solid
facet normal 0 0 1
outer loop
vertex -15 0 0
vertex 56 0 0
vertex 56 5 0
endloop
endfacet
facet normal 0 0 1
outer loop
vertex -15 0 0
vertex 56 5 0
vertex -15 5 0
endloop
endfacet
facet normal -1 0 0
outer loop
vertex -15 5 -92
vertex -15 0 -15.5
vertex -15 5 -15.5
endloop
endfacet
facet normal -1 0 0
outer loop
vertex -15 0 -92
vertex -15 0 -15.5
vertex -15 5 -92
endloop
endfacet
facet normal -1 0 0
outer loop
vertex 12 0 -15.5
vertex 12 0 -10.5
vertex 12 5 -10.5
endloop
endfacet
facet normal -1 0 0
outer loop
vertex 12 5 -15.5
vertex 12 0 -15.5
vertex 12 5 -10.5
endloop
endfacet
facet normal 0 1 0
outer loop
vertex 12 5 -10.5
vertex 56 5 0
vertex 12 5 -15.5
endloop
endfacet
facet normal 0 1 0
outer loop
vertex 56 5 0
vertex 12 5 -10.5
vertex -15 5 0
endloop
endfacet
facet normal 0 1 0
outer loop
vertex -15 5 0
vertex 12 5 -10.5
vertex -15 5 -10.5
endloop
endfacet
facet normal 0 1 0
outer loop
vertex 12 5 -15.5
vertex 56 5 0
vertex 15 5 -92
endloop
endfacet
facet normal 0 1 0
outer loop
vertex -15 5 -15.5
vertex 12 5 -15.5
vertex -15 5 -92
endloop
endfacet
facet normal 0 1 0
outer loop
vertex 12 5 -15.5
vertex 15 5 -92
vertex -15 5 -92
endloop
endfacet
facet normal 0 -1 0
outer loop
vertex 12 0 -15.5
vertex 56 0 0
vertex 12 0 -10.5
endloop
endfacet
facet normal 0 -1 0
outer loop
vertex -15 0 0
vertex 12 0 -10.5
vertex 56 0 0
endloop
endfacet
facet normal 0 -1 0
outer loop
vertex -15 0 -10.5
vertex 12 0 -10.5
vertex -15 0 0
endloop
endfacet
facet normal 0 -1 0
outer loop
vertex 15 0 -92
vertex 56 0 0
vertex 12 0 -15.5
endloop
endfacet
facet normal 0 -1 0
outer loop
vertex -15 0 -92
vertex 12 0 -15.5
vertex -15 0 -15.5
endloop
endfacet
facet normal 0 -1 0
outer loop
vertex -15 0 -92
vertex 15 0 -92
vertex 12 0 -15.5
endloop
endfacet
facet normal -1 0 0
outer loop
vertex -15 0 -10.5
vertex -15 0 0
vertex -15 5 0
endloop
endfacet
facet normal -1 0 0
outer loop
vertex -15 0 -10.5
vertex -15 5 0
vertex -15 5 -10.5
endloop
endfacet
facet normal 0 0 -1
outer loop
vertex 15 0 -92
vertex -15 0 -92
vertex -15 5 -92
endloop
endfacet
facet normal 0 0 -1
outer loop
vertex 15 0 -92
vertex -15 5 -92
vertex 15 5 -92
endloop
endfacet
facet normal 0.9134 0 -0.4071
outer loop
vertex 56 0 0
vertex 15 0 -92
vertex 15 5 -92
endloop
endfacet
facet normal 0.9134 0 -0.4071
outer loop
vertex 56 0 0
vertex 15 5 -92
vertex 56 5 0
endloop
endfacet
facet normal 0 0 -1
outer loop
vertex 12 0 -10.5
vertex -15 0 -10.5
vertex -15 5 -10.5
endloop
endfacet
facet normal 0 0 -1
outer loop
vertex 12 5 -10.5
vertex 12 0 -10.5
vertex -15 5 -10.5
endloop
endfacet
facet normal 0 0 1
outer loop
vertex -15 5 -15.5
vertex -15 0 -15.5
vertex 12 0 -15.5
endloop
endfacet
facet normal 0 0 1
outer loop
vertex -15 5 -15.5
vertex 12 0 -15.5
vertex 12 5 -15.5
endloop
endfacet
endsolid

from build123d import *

# Parameters (mm, degrees)
SM_BASE_FLANGE_1_DEPTH = 5
OTHER_START            = -15
OTHER_1_OUTLINE_W      = 5
OTHER_1_OUTLINE_H      = 5
OTHER_1_DEPTH          = 27


# Read off the part's stored shape, not the designer's step: Полость1
# Sheet-metal steps are written as plain solids
with BuildPart() as part:
    # Sketch 1 → Базовая кромка1 (new body)
    with BuildSketch(Plane(origin=(0, 0, 0), x_dir=(1, 0, 0), z_dir=(0, 1, 0))):
        Polygon((-15, 0), (-15, 92), (15, 92), (56, 0), align=None)
    extrude(amount=SM_BASE_FLANGE_1_DEPTH)

    # Полость1 outline → Полость1 (cut)
    with BuildSketch(Plane.YZ.offset(OTHER_START)):
        with Locations((2.5, -13)):
            Rectangle(OTHER_1_OUTLINE_W, OTHER_1_OUTLINE_H)
    extrude(amount=OTHER_1_DEPTH, mode=Mode.SUBTRACT)


solid = part.part
